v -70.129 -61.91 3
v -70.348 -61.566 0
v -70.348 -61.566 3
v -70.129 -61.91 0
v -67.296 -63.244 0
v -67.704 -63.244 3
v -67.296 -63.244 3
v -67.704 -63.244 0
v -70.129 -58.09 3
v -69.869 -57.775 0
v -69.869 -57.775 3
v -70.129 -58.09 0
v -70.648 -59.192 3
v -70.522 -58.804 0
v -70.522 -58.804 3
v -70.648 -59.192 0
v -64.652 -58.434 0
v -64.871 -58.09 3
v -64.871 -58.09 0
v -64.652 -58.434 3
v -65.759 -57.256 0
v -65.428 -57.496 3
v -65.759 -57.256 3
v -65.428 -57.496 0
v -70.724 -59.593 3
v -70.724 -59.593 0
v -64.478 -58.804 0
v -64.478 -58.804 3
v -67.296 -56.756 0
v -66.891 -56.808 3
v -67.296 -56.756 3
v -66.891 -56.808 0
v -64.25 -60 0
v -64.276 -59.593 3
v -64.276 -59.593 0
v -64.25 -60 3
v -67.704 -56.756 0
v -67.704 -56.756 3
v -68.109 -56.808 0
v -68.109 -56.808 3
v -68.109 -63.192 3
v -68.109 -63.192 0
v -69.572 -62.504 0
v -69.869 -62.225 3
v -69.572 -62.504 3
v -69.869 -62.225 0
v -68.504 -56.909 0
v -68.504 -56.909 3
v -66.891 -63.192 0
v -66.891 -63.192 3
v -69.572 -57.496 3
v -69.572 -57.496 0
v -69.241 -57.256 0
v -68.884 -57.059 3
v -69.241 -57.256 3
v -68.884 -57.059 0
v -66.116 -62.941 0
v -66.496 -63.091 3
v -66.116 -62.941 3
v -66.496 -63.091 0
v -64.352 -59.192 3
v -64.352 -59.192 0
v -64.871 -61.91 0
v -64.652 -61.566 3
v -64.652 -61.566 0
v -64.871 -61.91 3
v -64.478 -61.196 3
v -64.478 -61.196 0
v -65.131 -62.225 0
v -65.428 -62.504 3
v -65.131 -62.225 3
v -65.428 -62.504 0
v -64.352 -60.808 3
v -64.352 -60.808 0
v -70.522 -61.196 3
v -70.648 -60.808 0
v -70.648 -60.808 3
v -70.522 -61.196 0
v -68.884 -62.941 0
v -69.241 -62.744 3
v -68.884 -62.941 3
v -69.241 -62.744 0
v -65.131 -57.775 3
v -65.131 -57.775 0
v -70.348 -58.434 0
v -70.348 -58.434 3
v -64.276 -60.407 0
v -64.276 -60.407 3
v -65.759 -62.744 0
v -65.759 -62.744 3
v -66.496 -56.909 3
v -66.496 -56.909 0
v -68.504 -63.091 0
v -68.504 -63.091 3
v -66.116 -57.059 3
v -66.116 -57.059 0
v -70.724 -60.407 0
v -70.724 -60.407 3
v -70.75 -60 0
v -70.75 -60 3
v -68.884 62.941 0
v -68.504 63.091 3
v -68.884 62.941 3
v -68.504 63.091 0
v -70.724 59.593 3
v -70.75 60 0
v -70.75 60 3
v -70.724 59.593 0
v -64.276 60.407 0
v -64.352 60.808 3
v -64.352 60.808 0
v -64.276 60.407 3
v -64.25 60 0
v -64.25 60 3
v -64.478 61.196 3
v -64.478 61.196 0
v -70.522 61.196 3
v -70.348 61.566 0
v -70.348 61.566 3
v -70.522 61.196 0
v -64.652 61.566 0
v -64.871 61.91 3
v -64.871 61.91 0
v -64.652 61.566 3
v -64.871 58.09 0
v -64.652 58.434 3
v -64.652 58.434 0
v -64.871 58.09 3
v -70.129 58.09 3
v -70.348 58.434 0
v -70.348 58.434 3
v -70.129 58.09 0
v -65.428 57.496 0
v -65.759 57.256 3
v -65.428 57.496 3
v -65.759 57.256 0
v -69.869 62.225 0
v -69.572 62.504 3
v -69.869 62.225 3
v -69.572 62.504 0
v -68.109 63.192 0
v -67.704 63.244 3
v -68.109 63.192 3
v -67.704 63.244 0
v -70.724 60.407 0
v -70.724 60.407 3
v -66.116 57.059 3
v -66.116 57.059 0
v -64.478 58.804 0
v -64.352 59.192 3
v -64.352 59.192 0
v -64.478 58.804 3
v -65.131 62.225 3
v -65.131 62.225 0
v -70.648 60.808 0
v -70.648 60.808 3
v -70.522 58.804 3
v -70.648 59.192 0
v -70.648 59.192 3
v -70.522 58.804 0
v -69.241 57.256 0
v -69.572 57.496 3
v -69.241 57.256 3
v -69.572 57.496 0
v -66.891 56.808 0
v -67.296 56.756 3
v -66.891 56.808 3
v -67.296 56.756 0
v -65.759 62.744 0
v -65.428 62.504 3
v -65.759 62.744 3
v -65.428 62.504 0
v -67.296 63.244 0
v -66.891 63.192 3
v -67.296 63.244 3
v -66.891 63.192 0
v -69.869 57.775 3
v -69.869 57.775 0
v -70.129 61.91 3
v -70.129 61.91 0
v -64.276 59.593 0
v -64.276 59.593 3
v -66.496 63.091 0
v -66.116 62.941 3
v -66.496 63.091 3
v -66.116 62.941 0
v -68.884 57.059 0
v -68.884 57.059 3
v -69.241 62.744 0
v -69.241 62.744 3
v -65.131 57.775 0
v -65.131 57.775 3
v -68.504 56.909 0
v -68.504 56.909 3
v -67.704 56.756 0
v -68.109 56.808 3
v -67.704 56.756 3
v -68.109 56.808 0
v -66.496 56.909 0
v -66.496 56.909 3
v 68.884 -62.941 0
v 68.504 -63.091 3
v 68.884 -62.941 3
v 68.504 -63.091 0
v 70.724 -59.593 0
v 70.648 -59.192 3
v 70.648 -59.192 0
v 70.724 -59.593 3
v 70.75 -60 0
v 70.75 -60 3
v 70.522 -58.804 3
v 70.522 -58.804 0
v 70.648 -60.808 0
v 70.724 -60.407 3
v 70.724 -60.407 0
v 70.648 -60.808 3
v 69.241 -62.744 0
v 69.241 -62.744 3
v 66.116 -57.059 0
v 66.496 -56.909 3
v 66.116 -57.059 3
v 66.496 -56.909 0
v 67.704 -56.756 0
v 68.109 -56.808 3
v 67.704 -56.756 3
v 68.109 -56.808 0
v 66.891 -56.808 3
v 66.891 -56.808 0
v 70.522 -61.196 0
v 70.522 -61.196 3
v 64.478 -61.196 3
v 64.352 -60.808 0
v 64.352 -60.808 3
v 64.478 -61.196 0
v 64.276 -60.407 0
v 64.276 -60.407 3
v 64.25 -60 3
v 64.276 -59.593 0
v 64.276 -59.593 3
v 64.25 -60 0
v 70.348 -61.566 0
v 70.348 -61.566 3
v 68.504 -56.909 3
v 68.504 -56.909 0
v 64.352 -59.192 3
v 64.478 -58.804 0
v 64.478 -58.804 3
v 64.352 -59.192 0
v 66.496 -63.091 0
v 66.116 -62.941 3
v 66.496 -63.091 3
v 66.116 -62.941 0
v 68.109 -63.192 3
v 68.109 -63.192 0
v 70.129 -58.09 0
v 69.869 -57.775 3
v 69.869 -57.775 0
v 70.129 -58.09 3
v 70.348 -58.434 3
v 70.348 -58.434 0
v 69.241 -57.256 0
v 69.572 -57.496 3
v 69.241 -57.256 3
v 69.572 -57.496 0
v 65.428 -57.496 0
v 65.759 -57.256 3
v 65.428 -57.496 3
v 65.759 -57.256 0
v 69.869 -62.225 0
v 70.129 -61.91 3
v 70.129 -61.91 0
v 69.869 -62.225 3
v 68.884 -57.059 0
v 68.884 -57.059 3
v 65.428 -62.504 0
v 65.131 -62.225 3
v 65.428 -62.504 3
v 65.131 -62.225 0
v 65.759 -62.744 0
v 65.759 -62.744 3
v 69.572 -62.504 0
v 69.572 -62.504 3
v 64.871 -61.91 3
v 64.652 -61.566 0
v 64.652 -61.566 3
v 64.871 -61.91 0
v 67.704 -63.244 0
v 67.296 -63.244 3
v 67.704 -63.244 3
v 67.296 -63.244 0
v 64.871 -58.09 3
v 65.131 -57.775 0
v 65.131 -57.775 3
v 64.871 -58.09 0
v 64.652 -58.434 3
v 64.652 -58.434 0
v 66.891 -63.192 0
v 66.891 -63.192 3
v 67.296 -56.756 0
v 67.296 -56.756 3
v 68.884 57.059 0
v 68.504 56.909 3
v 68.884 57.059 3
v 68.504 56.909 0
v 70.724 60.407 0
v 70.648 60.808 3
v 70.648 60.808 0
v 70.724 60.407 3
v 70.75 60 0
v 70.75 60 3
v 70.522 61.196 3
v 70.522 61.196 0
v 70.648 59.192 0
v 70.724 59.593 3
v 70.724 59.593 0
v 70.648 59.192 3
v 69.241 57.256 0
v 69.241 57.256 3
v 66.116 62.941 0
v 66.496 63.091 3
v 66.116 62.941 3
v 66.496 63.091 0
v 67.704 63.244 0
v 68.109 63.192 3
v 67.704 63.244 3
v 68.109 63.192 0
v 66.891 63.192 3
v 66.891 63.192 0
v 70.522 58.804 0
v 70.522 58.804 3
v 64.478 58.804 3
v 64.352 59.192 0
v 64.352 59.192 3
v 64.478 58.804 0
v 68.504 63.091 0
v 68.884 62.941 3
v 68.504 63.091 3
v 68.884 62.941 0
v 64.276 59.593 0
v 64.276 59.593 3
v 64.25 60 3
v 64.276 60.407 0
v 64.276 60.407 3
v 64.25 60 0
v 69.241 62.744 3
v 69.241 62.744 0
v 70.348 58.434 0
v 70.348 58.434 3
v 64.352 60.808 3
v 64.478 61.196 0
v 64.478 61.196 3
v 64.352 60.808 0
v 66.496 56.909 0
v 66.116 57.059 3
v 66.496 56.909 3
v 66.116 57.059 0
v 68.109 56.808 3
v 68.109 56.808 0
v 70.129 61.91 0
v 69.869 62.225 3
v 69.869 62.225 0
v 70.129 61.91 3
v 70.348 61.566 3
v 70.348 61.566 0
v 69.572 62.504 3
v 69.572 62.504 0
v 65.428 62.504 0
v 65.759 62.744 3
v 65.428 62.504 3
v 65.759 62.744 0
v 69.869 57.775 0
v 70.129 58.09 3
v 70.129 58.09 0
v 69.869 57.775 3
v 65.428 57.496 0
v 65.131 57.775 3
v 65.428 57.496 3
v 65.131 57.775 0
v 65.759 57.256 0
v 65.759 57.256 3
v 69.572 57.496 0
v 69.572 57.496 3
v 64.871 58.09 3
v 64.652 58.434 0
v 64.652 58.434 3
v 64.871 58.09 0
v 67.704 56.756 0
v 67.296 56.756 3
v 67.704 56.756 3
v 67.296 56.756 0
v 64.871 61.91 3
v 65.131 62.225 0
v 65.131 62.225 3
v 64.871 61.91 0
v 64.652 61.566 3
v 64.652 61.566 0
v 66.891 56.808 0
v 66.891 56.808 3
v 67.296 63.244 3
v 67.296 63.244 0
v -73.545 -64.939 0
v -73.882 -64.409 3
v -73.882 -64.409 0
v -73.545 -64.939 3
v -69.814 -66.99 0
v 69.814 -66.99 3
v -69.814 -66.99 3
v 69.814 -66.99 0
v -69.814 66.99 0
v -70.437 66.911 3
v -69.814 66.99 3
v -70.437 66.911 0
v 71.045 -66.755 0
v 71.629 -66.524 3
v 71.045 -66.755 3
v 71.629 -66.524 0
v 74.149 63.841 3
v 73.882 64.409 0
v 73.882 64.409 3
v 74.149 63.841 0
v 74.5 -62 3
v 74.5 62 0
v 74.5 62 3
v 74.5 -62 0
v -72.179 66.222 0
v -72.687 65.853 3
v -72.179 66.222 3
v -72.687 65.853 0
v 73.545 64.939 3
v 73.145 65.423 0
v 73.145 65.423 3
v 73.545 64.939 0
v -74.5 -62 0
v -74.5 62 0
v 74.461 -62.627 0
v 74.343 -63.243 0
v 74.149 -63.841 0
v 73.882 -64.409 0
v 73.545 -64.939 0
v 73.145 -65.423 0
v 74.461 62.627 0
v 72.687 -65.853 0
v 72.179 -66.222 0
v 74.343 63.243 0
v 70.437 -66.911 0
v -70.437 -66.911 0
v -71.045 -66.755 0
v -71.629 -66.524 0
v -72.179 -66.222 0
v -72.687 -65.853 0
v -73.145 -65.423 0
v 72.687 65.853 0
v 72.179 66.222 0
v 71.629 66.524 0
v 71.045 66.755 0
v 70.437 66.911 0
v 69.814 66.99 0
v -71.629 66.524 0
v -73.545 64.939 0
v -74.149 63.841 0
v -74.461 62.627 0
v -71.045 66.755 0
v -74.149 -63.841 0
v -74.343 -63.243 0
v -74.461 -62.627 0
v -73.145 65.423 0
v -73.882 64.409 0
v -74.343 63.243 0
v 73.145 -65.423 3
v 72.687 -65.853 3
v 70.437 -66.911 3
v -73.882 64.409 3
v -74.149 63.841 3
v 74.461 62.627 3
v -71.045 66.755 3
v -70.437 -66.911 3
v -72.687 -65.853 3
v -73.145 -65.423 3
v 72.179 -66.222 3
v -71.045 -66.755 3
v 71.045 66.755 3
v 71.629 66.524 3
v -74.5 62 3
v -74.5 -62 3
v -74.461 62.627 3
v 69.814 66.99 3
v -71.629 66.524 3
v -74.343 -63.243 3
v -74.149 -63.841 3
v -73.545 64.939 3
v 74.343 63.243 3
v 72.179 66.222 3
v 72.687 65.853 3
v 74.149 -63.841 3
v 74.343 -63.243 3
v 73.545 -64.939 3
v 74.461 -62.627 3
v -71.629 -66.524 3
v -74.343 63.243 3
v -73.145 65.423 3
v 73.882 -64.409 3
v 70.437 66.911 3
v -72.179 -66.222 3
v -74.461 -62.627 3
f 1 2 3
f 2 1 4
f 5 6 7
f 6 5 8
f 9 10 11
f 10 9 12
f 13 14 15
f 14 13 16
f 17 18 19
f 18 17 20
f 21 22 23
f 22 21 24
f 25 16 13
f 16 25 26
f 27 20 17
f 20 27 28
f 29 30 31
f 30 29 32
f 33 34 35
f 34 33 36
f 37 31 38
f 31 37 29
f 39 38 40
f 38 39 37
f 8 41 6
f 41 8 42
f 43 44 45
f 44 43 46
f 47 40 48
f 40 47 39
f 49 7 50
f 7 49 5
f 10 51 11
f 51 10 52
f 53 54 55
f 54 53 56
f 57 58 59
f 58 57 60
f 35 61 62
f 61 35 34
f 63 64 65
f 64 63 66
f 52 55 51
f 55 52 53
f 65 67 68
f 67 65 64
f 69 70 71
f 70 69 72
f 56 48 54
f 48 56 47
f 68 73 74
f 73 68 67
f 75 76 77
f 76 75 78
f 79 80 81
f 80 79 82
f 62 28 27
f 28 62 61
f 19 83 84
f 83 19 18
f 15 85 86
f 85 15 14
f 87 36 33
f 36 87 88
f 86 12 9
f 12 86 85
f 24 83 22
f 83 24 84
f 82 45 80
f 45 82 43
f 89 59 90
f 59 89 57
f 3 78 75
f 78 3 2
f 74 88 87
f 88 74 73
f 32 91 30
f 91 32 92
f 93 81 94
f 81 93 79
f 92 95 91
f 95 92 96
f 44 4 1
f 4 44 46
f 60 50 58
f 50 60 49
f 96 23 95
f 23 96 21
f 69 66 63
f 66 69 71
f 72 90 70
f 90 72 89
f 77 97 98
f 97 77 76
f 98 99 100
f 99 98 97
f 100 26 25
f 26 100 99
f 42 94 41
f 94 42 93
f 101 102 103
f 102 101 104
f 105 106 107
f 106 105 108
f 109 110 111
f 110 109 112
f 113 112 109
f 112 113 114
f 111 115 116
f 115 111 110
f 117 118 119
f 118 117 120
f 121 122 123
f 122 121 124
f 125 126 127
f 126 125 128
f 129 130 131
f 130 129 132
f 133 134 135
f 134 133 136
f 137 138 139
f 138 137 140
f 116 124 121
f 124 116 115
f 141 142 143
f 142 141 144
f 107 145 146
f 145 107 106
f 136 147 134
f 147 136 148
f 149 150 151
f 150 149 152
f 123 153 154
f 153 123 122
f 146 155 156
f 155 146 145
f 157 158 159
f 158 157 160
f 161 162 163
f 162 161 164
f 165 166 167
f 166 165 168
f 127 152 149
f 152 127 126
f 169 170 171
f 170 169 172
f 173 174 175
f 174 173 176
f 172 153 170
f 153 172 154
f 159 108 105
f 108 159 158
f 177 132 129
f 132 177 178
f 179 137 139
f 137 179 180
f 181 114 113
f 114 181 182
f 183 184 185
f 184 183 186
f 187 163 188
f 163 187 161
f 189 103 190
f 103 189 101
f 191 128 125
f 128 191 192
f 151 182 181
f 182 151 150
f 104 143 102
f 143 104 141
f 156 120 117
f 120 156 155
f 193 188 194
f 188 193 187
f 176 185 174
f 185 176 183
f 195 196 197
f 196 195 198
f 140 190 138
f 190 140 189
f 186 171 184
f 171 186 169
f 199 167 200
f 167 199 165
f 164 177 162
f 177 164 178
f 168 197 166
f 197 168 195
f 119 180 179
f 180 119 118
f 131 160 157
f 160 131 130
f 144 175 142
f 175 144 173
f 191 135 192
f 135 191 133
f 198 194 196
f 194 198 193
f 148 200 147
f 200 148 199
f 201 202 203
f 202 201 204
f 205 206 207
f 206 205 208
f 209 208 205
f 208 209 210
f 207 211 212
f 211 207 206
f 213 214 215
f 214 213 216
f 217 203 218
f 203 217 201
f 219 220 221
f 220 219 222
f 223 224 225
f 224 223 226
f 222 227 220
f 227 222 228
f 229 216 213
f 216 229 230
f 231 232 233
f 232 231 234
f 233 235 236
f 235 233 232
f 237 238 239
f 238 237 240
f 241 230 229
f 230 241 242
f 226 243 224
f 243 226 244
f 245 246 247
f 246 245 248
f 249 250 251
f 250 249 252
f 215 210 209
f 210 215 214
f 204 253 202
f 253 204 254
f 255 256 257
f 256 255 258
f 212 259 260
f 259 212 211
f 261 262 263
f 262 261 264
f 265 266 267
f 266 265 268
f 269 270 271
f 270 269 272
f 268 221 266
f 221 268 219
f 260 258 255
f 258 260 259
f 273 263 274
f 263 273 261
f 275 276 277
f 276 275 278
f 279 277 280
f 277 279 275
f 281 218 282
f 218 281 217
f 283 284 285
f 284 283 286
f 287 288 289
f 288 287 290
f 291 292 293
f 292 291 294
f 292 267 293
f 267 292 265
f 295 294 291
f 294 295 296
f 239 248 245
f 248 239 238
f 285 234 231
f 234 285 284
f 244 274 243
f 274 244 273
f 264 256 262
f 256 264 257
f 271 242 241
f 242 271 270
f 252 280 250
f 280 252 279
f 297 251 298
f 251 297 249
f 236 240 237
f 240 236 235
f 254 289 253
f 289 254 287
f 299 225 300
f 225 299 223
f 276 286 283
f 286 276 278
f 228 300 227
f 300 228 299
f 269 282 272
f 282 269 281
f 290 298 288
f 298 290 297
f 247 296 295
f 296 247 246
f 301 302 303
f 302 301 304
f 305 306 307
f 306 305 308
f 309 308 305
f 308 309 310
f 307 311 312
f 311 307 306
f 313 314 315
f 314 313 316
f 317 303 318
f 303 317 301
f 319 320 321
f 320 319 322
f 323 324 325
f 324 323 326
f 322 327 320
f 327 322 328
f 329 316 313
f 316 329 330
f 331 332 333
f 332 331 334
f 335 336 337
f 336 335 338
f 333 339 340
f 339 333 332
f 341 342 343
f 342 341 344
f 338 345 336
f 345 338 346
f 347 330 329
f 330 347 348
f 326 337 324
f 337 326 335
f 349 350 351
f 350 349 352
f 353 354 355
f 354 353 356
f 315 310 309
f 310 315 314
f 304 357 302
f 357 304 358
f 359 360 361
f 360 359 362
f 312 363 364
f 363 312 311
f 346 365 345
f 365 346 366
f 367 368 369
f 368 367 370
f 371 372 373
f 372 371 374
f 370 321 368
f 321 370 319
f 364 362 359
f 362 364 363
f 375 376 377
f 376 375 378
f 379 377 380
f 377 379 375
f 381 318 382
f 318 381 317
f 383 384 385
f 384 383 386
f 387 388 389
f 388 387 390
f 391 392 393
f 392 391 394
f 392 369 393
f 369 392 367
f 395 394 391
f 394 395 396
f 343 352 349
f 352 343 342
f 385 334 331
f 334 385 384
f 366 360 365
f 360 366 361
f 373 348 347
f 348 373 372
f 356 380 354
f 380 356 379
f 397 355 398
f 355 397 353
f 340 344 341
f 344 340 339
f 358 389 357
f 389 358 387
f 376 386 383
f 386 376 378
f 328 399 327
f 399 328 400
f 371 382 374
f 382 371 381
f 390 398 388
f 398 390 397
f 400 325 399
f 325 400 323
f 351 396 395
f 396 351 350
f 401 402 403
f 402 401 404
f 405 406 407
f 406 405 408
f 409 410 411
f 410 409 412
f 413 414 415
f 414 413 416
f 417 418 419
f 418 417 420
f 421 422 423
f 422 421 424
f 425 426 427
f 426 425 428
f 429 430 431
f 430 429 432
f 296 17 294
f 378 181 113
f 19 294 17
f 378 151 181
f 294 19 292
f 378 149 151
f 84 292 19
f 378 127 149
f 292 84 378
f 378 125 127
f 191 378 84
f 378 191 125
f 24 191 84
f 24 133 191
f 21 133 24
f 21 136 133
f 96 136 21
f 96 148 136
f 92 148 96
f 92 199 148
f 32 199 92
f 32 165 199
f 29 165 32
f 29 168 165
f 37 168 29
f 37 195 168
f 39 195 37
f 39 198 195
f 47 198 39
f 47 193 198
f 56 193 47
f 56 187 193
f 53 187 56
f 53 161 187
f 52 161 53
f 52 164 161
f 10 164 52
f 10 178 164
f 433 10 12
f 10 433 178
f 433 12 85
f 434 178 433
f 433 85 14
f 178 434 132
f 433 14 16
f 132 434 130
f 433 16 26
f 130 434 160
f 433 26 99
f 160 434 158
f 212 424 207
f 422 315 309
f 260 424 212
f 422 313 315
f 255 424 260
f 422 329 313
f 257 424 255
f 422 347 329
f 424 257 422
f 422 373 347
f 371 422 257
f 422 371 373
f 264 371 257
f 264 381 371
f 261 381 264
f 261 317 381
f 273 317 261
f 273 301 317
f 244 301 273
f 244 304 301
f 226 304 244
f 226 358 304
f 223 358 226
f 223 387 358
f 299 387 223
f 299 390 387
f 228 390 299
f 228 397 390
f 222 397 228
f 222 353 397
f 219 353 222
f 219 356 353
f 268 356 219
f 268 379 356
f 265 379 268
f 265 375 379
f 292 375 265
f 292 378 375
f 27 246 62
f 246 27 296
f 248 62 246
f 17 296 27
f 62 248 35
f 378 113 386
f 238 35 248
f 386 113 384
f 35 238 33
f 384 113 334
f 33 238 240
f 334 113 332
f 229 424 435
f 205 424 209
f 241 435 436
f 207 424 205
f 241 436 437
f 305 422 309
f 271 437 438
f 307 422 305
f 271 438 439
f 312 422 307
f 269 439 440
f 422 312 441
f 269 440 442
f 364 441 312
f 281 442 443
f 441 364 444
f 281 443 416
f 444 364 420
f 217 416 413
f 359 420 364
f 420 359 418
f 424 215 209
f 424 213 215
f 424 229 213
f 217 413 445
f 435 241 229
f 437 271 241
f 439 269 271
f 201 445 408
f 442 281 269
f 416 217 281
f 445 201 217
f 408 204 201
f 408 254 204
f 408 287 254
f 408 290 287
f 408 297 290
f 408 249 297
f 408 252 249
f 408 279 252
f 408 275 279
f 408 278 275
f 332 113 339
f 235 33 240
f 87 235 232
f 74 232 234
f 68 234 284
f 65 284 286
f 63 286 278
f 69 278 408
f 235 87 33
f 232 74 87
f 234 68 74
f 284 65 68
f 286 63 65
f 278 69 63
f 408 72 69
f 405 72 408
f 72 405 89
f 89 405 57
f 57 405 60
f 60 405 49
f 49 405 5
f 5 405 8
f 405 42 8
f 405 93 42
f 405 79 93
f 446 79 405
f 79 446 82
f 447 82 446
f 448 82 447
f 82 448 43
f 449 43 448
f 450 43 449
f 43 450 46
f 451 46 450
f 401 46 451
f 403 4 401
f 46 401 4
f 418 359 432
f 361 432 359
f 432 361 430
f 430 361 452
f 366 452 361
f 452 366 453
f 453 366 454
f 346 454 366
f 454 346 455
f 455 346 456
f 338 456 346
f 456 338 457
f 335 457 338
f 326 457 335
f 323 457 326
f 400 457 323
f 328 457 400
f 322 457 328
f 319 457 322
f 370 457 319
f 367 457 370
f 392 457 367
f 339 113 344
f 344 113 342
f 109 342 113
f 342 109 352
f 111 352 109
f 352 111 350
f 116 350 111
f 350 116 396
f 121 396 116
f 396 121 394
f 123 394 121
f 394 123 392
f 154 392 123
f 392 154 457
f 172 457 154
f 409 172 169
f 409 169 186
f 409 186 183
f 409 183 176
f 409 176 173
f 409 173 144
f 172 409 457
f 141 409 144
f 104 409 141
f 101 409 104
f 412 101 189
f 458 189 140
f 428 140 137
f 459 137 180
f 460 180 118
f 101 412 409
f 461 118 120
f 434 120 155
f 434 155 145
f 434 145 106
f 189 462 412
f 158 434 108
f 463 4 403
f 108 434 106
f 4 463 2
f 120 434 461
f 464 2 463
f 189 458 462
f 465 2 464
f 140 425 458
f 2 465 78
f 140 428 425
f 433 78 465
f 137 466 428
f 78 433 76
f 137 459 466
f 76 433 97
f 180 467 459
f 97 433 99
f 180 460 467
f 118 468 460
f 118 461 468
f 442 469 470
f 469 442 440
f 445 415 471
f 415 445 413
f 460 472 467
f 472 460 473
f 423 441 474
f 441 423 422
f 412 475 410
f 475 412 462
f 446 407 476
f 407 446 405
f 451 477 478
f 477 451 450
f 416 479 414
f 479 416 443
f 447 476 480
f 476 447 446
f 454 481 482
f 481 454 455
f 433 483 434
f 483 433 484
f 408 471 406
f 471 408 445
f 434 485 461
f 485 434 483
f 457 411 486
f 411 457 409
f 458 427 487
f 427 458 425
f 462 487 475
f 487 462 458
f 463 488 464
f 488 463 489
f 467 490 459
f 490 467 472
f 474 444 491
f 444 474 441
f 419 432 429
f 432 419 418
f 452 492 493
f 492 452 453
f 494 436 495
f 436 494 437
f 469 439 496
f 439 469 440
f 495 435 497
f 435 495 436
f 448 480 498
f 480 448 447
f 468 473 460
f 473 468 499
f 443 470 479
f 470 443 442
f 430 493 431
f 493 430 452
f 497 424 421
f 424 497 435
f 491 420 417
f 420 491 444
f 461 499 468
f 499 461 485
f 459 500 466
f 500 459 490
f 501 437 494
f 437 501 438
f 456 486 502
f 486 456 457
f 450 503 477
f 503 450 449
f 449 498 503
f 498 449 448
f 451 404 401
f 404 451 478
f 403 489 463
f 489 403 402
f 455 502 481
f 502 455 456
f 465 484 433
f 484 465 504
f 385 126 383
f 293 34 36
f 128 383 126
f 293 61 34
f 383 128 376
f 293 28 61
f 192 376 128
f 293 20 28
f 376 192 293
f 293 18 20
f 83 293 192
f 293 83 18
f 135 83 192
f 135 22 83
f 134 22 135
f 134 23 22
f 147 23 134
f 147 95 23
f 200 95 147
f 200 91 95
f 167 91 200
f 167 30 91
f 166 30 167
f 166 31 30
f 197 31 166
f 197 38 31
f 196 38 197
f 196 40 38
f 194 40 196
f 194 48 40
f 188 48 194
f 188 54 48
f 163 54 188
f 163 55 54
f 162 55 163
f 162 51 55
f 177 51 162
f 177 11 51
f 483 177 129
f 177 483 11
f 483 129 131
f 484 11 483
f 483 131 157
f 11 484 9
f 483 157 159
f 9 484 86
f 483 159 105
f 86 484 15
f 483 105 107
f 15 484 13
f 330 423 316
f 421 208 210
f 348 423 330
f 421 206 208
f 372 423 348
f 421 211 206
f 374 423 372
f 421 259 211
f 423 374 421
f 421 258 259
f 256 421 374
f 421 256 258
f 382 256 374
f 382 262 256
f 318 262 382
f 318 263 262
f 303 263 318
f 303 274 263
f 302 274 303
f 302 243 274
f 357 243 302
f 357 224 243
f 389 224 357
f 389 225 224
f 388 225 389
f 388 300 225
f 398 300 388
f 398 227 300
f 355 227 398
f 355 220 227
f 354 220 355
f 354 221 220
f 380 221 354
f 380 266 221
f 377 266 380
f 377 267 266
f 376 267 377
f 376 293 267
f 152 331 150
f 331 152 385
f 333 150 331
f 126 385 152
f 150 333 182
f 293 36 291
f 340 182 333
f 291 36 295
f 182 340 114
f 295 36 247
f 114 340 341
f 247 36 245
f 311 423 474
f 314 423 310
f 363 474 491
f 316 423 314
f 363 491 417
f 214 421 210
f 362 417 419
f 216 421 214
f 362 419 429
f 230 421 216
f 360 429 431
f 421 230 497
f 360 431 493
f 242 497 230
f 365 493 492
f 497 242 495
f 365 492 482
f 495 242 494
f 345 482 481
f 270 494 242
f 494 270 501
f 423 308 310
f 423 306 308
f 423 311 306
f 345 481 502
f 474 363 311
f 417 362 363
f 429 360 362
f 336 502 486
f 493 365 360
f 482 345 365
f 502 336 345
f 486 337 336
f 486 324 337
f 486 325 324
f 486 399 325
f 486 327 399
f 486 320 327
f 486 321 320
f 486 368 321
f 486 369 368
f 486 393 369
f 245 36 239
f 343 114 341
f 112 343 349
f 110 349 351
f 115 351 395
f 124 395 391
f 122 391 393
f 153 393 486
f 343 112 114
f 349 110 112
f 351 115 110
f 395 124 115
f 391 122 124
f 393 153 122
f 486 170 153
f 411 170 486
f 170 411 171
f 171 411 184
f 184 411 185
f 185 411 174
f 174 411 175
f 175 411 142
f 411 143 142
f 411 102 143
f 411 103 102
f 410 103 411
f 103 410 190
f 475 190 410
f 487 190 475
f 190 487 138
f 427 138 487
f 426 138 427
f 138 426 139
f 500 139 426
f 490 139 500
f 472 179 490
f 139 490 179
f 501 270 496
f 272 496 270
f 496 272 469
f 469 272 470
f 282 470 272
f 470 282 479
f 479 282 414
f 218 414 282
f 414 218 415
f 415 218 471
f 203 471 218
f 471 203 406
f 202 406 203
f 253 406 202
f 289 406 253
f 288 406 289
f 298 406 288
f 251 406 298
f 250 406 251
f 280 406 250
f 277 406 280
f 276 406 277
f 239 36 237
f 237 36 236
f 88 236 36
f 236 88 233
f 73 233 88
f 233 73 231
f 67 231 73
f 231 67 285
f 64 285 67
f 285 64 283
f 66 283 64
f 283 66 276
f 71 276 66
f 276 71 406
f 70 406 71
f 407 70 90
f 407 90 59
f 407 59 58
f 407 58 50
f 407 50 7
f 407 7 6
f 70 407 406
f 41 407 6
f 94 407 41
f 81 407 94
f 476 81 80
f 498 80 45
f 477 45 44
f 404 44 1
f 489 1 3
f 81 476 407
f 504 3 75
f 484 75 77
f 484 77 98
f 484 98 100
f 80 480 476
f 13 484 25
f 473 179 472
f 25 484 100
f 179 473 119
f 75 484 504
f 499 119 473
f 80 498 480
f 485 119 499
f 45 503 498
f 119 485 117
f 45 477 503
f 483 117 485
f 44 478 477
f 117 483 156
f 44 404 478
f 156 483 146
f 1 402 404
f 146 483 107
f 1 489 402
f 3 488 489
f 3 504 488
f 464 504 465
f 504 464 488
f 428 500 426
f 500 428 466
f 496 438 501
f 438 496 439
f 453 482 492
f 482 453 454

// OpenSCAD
$fn = 50;


difference() {
	union() {
		hull() {
			translate(v = [-69.5000000000, 62.0000000000, 0]) {
				cylinder(h = 3, r = 5);
			}
			translate(v = [69.5000000000, 62.0000000000, 0]) {
				cylinder(h = 3, r = 5);
			}
			translate(v = [-69.5000000000, -62.0000000000, 0]) {
				cylinder(h = 3, r = 5);
			}
			translate(v = [69.5000000000, -62.0000000000, 0]) {
				cylinder(h = 3, r = 5);
			}
		}
	}
	union() {
		translate(v = [-67.5000000000, -60.0000000000, -100.0000000000]) {
			cylinder(h = 200, r = 3.2500000000);
		}
		translate(v = [-67.5000000000, 60.0000000000, -100.0000000000]) {
			cylinder(h = 200, r = 3.2500000000);
		}
		translate(v = [67.5000000000, -60.0000000000, -100.0000000000]) {
			cylinder(h = 200, r = 3.2500000000);
		}
		translate(v = [67.5000000000, 60.0000000000, -100.0000000000]) {
			cylinder(h = 200, r = 3.2500000000);
		}
	}
}
